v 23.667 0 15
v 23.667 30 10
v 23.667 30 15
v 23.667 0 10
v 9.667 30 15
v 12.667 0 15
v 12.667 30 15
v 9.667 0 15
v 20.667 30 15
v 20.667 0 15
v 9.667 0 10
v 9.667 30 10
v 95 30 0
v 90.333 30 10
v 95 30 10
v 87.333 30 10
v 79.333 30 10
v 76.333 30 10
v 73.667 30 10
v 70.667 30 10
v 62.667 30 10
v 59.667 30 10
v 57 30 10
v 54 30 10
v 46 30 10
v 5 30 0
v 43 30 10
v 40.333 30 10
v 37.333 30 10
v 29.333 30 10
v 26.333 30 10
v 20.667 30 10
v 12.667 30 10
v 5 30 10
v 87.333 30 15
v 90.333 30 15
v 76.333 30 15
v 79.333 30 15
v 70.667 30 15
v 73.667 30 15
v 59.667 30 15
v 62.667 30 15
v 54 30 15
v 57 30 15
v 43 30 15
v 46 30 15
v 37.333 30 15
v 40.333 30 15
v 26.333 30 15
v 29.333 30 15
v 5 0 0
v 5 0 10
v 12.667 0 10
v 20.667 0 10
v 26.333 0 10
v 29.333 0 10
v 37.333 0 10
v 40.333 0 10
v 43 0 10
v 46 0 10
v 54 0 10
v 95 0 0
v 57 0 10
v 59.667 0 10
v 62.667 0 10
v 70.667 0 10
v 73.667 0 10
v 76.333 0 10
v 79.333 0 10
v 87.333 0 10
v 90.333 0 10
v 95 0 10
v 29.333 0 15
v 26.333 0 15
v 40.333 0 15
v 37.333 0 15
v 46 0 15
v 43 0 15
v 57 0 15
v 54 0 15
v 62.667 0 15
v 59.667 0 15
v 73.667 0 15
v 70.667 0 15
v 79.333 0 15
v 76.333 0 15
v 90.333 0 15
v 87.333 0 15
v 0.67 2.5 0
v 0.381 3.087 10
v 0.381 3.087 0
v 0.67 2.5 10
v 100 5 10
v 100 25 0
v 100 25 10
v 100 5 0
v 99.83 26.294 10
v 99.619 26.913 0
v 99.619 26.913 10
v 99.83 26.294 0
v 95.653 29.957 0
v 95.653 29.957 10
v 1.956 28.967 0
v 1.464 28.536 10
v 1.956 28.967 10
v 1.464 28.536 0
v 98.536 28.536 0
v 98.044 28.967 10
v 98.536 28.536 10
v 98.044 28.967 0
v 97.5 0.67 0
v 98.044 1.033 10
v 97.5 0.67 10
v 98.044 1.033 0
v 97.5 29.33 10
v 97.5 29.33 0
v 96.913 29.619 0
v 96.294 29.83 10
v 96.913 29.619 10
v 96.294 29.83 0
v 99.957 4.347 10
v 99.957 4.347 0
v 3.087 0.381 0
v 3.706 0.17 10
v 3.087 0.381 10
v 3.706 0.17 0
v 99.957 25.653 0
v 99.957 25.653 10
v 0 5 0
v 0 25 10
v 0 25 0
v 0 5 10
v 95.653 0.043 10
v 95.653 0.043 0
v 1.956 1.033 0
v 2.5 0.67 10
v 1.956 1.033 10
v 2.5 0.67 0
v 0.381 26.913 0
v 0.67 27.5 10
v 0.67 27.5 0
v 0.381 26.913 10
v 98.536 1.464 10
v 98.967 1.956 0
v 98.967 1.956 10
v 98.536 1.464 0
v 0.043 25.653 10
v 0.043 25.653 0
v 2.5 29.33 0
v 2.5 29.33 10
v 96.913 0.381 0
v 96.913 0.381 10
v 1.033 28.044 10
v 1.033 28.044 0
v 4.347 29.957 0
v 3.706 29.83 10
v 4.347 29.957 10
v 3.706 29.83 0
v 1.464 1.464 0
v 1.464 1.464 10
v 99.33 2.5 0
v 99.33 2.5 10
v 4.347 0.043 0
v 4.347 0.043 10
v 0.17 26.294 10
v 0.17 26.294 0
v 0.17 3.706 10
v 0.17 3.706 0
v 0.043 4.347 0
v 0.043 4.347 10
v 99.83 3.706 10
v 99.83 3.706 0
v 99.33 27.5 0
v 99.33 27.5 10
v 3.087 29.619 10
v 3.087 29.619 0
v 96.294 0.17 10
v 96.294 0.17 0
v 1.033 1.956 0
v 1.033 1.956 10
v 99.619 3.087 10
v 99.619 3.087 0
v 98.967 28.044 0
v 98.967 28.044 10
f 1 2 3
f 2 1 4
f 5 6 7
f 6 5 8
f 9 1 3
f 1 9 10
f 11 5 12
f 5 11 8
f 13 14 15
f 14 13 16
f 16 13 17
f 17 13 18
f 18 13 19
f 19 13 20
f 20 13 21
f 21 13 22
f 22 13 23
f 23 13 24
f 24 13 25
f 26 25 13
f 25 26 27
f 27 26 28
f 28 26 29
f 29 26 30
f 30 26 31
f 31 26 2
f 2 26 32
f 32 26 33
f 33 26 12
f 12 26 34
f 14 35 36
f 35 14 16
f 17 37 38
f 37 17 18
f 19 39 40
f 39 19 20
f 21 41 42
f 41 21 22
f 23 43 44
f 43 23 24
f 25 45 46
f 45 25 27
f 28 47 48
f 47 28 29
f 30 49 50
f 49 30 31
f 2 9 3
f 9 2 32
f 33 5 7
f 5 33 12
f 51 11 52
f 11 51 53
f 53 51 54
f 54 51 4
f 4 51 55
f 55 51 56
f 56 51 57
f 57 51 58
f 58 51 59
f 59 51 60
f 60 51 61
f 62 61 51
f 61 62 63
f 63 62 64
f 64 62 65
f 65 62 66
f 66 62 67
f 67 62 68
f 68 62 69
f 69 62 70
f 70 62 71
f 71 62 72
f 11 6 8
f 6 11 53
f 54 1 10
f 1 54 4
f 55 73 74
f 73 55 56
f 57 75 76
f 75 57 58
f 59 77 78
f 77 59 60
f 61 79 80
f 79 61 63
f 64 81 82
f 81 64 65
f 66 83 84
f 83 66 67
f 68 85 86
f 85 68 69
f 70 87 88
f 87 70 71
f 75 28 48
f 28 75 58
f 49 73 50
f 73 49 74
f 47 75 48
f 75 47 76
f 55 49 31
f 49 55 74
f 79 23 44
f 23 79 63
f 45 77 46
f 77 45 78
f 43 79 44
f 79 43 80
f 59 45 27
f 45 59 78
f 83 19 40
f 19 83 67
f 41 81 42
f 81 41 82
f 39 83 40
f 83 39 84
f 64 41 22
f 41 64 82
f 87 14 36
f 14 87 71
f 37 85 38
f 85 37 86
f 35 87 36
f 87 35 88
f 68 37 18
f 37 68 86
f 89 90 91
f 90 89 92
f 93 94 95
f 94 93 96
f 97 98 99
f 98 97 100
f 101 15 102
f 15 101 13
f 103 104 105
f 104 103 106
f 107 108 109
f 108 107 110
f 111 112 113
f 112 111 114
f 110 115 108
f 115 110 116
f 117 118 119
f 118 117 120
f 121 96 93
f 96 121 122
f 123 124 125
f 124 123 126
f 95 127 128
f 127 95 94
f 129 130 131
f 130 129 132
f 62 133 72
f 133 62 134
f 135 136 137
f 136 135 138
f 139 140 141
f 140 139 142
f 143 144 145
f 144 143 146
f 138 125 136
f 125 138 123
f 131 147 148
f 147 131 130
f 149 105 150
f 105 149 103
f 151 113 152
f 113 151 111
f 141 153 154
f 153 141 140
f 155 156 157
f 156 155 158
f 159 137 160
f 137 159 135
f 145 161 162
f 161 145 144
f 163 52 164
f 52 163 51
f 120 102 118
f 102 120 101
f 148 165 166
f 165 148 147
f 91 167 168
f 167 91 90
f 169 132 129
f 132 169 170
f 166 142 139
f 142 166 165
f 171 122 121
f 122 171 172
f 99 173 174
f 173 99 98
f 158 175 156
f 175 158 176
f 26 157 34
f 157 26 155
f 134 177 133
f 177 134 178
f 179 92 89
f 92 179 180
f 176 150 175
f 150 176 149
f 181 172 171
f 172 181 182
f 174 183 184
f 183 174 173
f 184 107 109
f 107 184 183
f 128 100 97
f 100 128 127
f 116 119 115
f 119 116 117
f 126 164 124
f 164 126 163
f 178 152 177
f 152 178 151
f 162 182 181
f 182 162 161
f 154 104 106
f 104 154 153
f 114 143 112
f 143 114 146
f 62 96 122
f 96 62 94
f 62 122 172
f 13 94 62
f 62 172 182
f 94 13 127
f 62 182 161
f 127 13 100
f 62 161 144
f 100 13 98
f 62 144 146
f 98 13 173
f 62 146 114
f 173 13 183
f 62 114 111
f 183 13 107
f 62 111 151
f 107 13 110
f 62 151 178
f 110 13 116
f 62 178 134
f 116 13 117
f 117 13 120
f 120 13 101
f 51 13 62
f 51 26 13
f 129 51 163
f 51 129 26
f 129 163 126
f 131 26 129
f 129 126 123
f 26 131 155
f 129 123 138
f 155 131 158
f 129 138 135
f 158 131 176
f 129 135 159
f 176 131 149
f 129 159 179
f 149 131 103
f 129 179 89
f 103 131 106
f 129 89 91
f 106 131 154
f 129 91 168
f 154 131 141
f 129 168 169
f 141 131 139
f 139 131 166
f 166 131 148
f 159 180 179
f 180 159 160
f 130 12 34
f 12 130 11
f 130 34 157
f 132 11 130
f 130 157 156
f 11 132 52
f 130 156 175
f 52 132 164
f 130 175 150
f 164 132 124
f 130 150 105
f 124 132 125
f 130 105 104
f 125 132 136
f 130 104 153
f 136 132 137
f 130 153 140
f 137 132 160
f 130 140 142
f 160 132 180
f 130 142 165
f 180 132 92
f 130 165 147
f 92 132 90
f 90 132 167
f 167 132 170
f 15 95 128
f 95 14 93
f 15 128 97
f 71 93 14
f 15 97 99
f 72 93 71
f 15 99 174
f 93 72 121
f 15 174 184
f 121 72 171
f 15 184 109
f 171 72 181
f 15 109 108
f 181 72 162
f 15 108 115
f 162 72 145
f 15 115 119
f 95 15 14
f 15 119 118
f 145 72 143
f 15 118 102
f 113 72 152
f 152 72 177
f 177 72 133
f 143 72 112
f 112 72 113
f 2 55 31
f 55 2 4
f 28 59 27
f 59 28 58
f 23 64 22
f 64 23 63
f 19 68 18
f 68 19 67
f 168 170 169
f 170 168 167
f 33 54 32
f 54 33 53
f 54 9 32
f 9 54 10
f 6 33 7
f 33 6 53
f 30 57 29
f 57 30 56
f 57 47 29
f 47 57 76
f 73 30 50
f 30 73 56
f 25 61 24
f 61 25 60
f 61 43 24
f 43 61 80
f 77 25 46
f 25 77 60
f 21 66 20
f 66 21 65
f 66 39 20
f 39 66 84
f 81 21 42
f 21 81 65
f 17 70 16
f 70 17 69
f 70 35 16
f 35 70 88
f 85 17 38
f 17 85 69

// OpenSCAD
// Cable Organizer
// Keeps your desk cables tidy with customizable slots
// License: CC0 (Public Domain)

/* [Base] */
// Length of the organizer
length = 100; // [50:200]

// Width of the organizer
width = 30; // [20:60]

// Height (thickness of base)
base_height = 10; // [5:20]

/* [Slots] */
// Number of cable slots
num_slots = 5; // [1:10]

// Slot style
slot_style = "round"; // [round, square, teardrop]

// Slot diameter (for round slots)
slot_diameter = 8; // [3:15]

// Slot width (for square slots)
slot_width = 8; // [3:15]

/* [Mounting] */
// Mounting type
mount_type = "desk"; // [desk, adhesive, screw_holes]

// Add screw holes
add_screw_holes = "no"; // [yes, no]

// Screw hole diameter
screw_diameter = 4; // [3:6]

/* [Features] */
// Add cable labels
add_labels = "no"; // [yes, no]

// Label depth (engraving)
label_depth = 0.5; // [0.3:0.1:1.0]

// Add grip texture
add_texture = "no"; // [yes, no]

/* [Quality] */
$fn = 48; // [24:64]

/* [Hidden] */
slot_spacing = length / (num_slots + 1);
slot_height = base_height * 1.5;  // Slots extend above base

module cable_organizer() {
    difference() {
        union() {
            // Base
            base();
            
            // Slot walls
            slot_holders();
        }
        
        // Cut slots
        cable_slots();
        
        // Screw holes
        if (add_screw_holes == "yes" || mount_type == "screw_holes") {
            screw_holes();
        }
    }
    
    // Add texture on top if requested
    if (add_texture == "yes") {
        texture_pattern();
    }
}

module base() {
    hull() {
        translate([base_height/2, base_height/2, 0])
            cylinder(r=base_height/2, h=base_height);
        translate([length - base_height/2, base_height/2, 0])
            cylinder(r=base_height/2, h=base_height);
        translate([base_height/2, width - base_height/2, 0])
            cylinder(r=base_height/2, h=base_height);
        translate([length - base_height/2, width - base_height/2, 0])
            cylinder(r=base_height/2, h=base_height);
    }
}

module slot_holders() {
    for (i = [1:num_slots]) {
        translate([slot_spacing * i - slot_diameter/2 - 3, 0, base_height - 0.1]) {
            cube([slot_diameter + 6, width, slot_height - base_height + 0.1]);
        }
    }
}

module cable_slots() {
    for (i = [1:num_slots]) {
        pos_x = slot_spacing * i;
        
        if (slot_style == "round") {
            // Round slot with entry from top
            translate([pos_x, width/2, base_height])
                cylinder(d=slot_diameter, h=slot_height);
            // Entry slot
            translate([pos_x, width/2, base_height + slot_height/2])
                cube([slot_diameter, width, slot_height], center=true);
        } else if (slot_style == "square") {
            // Square slot
            translate([pos_x - slot_width/2, 0, base_height])
                cube([slot_width, width, slot_height]);
        } else if (slot_style == "teardrop") {
            // Teardrop shape (easier to print)
            translate([pos_x, width/2, base_height]) {
                cylinder(d=slot_diameter, h=slot_height);
                translate([0, 0, slot_height/2])
                    rotate([0, 0, 45])
                    cube([slot_diameter/sqrt(2), slot_diameter/sqrt(2), slot_height], center=true);
            }
            // Entry slot
            translate([pos_x, width/2, base_height + slot_height/2])
                cube([slot_diameter, width, slot_height], center=true);
        }
    }
}

module screw_holes() {
    // Corner holes
    translate([base_height, base_height, -0.1])
        cylinder(d=screw_diameter, h=base_height + 0.2);
    translate([length - base_height, base_height, -0.1])
        cylinder(d=screw_diameter, h=base_height + 0.2);
    translate([base_height, width - base_height, -0.1])
        cylinder(d=screw_diameter, h=base_height + 0.2);
    translate([length - base_height, width - base_height, -0.1])
        cylinder(d=screw_diameter, h=base_height + 0.2);
}

module texture_pattern() {
    // Add small bumps for grip
    spacing = 5;
    for (x = [spacing:spacing*2:length-spacing]) {
        for (y = [spacing:spacing*2:width-spacing]) {
            translate([x, y, base_height - 0.1])
                cylinder(d=2, h=0.5);
        }
    }
}

// Render
cable_organizer();
